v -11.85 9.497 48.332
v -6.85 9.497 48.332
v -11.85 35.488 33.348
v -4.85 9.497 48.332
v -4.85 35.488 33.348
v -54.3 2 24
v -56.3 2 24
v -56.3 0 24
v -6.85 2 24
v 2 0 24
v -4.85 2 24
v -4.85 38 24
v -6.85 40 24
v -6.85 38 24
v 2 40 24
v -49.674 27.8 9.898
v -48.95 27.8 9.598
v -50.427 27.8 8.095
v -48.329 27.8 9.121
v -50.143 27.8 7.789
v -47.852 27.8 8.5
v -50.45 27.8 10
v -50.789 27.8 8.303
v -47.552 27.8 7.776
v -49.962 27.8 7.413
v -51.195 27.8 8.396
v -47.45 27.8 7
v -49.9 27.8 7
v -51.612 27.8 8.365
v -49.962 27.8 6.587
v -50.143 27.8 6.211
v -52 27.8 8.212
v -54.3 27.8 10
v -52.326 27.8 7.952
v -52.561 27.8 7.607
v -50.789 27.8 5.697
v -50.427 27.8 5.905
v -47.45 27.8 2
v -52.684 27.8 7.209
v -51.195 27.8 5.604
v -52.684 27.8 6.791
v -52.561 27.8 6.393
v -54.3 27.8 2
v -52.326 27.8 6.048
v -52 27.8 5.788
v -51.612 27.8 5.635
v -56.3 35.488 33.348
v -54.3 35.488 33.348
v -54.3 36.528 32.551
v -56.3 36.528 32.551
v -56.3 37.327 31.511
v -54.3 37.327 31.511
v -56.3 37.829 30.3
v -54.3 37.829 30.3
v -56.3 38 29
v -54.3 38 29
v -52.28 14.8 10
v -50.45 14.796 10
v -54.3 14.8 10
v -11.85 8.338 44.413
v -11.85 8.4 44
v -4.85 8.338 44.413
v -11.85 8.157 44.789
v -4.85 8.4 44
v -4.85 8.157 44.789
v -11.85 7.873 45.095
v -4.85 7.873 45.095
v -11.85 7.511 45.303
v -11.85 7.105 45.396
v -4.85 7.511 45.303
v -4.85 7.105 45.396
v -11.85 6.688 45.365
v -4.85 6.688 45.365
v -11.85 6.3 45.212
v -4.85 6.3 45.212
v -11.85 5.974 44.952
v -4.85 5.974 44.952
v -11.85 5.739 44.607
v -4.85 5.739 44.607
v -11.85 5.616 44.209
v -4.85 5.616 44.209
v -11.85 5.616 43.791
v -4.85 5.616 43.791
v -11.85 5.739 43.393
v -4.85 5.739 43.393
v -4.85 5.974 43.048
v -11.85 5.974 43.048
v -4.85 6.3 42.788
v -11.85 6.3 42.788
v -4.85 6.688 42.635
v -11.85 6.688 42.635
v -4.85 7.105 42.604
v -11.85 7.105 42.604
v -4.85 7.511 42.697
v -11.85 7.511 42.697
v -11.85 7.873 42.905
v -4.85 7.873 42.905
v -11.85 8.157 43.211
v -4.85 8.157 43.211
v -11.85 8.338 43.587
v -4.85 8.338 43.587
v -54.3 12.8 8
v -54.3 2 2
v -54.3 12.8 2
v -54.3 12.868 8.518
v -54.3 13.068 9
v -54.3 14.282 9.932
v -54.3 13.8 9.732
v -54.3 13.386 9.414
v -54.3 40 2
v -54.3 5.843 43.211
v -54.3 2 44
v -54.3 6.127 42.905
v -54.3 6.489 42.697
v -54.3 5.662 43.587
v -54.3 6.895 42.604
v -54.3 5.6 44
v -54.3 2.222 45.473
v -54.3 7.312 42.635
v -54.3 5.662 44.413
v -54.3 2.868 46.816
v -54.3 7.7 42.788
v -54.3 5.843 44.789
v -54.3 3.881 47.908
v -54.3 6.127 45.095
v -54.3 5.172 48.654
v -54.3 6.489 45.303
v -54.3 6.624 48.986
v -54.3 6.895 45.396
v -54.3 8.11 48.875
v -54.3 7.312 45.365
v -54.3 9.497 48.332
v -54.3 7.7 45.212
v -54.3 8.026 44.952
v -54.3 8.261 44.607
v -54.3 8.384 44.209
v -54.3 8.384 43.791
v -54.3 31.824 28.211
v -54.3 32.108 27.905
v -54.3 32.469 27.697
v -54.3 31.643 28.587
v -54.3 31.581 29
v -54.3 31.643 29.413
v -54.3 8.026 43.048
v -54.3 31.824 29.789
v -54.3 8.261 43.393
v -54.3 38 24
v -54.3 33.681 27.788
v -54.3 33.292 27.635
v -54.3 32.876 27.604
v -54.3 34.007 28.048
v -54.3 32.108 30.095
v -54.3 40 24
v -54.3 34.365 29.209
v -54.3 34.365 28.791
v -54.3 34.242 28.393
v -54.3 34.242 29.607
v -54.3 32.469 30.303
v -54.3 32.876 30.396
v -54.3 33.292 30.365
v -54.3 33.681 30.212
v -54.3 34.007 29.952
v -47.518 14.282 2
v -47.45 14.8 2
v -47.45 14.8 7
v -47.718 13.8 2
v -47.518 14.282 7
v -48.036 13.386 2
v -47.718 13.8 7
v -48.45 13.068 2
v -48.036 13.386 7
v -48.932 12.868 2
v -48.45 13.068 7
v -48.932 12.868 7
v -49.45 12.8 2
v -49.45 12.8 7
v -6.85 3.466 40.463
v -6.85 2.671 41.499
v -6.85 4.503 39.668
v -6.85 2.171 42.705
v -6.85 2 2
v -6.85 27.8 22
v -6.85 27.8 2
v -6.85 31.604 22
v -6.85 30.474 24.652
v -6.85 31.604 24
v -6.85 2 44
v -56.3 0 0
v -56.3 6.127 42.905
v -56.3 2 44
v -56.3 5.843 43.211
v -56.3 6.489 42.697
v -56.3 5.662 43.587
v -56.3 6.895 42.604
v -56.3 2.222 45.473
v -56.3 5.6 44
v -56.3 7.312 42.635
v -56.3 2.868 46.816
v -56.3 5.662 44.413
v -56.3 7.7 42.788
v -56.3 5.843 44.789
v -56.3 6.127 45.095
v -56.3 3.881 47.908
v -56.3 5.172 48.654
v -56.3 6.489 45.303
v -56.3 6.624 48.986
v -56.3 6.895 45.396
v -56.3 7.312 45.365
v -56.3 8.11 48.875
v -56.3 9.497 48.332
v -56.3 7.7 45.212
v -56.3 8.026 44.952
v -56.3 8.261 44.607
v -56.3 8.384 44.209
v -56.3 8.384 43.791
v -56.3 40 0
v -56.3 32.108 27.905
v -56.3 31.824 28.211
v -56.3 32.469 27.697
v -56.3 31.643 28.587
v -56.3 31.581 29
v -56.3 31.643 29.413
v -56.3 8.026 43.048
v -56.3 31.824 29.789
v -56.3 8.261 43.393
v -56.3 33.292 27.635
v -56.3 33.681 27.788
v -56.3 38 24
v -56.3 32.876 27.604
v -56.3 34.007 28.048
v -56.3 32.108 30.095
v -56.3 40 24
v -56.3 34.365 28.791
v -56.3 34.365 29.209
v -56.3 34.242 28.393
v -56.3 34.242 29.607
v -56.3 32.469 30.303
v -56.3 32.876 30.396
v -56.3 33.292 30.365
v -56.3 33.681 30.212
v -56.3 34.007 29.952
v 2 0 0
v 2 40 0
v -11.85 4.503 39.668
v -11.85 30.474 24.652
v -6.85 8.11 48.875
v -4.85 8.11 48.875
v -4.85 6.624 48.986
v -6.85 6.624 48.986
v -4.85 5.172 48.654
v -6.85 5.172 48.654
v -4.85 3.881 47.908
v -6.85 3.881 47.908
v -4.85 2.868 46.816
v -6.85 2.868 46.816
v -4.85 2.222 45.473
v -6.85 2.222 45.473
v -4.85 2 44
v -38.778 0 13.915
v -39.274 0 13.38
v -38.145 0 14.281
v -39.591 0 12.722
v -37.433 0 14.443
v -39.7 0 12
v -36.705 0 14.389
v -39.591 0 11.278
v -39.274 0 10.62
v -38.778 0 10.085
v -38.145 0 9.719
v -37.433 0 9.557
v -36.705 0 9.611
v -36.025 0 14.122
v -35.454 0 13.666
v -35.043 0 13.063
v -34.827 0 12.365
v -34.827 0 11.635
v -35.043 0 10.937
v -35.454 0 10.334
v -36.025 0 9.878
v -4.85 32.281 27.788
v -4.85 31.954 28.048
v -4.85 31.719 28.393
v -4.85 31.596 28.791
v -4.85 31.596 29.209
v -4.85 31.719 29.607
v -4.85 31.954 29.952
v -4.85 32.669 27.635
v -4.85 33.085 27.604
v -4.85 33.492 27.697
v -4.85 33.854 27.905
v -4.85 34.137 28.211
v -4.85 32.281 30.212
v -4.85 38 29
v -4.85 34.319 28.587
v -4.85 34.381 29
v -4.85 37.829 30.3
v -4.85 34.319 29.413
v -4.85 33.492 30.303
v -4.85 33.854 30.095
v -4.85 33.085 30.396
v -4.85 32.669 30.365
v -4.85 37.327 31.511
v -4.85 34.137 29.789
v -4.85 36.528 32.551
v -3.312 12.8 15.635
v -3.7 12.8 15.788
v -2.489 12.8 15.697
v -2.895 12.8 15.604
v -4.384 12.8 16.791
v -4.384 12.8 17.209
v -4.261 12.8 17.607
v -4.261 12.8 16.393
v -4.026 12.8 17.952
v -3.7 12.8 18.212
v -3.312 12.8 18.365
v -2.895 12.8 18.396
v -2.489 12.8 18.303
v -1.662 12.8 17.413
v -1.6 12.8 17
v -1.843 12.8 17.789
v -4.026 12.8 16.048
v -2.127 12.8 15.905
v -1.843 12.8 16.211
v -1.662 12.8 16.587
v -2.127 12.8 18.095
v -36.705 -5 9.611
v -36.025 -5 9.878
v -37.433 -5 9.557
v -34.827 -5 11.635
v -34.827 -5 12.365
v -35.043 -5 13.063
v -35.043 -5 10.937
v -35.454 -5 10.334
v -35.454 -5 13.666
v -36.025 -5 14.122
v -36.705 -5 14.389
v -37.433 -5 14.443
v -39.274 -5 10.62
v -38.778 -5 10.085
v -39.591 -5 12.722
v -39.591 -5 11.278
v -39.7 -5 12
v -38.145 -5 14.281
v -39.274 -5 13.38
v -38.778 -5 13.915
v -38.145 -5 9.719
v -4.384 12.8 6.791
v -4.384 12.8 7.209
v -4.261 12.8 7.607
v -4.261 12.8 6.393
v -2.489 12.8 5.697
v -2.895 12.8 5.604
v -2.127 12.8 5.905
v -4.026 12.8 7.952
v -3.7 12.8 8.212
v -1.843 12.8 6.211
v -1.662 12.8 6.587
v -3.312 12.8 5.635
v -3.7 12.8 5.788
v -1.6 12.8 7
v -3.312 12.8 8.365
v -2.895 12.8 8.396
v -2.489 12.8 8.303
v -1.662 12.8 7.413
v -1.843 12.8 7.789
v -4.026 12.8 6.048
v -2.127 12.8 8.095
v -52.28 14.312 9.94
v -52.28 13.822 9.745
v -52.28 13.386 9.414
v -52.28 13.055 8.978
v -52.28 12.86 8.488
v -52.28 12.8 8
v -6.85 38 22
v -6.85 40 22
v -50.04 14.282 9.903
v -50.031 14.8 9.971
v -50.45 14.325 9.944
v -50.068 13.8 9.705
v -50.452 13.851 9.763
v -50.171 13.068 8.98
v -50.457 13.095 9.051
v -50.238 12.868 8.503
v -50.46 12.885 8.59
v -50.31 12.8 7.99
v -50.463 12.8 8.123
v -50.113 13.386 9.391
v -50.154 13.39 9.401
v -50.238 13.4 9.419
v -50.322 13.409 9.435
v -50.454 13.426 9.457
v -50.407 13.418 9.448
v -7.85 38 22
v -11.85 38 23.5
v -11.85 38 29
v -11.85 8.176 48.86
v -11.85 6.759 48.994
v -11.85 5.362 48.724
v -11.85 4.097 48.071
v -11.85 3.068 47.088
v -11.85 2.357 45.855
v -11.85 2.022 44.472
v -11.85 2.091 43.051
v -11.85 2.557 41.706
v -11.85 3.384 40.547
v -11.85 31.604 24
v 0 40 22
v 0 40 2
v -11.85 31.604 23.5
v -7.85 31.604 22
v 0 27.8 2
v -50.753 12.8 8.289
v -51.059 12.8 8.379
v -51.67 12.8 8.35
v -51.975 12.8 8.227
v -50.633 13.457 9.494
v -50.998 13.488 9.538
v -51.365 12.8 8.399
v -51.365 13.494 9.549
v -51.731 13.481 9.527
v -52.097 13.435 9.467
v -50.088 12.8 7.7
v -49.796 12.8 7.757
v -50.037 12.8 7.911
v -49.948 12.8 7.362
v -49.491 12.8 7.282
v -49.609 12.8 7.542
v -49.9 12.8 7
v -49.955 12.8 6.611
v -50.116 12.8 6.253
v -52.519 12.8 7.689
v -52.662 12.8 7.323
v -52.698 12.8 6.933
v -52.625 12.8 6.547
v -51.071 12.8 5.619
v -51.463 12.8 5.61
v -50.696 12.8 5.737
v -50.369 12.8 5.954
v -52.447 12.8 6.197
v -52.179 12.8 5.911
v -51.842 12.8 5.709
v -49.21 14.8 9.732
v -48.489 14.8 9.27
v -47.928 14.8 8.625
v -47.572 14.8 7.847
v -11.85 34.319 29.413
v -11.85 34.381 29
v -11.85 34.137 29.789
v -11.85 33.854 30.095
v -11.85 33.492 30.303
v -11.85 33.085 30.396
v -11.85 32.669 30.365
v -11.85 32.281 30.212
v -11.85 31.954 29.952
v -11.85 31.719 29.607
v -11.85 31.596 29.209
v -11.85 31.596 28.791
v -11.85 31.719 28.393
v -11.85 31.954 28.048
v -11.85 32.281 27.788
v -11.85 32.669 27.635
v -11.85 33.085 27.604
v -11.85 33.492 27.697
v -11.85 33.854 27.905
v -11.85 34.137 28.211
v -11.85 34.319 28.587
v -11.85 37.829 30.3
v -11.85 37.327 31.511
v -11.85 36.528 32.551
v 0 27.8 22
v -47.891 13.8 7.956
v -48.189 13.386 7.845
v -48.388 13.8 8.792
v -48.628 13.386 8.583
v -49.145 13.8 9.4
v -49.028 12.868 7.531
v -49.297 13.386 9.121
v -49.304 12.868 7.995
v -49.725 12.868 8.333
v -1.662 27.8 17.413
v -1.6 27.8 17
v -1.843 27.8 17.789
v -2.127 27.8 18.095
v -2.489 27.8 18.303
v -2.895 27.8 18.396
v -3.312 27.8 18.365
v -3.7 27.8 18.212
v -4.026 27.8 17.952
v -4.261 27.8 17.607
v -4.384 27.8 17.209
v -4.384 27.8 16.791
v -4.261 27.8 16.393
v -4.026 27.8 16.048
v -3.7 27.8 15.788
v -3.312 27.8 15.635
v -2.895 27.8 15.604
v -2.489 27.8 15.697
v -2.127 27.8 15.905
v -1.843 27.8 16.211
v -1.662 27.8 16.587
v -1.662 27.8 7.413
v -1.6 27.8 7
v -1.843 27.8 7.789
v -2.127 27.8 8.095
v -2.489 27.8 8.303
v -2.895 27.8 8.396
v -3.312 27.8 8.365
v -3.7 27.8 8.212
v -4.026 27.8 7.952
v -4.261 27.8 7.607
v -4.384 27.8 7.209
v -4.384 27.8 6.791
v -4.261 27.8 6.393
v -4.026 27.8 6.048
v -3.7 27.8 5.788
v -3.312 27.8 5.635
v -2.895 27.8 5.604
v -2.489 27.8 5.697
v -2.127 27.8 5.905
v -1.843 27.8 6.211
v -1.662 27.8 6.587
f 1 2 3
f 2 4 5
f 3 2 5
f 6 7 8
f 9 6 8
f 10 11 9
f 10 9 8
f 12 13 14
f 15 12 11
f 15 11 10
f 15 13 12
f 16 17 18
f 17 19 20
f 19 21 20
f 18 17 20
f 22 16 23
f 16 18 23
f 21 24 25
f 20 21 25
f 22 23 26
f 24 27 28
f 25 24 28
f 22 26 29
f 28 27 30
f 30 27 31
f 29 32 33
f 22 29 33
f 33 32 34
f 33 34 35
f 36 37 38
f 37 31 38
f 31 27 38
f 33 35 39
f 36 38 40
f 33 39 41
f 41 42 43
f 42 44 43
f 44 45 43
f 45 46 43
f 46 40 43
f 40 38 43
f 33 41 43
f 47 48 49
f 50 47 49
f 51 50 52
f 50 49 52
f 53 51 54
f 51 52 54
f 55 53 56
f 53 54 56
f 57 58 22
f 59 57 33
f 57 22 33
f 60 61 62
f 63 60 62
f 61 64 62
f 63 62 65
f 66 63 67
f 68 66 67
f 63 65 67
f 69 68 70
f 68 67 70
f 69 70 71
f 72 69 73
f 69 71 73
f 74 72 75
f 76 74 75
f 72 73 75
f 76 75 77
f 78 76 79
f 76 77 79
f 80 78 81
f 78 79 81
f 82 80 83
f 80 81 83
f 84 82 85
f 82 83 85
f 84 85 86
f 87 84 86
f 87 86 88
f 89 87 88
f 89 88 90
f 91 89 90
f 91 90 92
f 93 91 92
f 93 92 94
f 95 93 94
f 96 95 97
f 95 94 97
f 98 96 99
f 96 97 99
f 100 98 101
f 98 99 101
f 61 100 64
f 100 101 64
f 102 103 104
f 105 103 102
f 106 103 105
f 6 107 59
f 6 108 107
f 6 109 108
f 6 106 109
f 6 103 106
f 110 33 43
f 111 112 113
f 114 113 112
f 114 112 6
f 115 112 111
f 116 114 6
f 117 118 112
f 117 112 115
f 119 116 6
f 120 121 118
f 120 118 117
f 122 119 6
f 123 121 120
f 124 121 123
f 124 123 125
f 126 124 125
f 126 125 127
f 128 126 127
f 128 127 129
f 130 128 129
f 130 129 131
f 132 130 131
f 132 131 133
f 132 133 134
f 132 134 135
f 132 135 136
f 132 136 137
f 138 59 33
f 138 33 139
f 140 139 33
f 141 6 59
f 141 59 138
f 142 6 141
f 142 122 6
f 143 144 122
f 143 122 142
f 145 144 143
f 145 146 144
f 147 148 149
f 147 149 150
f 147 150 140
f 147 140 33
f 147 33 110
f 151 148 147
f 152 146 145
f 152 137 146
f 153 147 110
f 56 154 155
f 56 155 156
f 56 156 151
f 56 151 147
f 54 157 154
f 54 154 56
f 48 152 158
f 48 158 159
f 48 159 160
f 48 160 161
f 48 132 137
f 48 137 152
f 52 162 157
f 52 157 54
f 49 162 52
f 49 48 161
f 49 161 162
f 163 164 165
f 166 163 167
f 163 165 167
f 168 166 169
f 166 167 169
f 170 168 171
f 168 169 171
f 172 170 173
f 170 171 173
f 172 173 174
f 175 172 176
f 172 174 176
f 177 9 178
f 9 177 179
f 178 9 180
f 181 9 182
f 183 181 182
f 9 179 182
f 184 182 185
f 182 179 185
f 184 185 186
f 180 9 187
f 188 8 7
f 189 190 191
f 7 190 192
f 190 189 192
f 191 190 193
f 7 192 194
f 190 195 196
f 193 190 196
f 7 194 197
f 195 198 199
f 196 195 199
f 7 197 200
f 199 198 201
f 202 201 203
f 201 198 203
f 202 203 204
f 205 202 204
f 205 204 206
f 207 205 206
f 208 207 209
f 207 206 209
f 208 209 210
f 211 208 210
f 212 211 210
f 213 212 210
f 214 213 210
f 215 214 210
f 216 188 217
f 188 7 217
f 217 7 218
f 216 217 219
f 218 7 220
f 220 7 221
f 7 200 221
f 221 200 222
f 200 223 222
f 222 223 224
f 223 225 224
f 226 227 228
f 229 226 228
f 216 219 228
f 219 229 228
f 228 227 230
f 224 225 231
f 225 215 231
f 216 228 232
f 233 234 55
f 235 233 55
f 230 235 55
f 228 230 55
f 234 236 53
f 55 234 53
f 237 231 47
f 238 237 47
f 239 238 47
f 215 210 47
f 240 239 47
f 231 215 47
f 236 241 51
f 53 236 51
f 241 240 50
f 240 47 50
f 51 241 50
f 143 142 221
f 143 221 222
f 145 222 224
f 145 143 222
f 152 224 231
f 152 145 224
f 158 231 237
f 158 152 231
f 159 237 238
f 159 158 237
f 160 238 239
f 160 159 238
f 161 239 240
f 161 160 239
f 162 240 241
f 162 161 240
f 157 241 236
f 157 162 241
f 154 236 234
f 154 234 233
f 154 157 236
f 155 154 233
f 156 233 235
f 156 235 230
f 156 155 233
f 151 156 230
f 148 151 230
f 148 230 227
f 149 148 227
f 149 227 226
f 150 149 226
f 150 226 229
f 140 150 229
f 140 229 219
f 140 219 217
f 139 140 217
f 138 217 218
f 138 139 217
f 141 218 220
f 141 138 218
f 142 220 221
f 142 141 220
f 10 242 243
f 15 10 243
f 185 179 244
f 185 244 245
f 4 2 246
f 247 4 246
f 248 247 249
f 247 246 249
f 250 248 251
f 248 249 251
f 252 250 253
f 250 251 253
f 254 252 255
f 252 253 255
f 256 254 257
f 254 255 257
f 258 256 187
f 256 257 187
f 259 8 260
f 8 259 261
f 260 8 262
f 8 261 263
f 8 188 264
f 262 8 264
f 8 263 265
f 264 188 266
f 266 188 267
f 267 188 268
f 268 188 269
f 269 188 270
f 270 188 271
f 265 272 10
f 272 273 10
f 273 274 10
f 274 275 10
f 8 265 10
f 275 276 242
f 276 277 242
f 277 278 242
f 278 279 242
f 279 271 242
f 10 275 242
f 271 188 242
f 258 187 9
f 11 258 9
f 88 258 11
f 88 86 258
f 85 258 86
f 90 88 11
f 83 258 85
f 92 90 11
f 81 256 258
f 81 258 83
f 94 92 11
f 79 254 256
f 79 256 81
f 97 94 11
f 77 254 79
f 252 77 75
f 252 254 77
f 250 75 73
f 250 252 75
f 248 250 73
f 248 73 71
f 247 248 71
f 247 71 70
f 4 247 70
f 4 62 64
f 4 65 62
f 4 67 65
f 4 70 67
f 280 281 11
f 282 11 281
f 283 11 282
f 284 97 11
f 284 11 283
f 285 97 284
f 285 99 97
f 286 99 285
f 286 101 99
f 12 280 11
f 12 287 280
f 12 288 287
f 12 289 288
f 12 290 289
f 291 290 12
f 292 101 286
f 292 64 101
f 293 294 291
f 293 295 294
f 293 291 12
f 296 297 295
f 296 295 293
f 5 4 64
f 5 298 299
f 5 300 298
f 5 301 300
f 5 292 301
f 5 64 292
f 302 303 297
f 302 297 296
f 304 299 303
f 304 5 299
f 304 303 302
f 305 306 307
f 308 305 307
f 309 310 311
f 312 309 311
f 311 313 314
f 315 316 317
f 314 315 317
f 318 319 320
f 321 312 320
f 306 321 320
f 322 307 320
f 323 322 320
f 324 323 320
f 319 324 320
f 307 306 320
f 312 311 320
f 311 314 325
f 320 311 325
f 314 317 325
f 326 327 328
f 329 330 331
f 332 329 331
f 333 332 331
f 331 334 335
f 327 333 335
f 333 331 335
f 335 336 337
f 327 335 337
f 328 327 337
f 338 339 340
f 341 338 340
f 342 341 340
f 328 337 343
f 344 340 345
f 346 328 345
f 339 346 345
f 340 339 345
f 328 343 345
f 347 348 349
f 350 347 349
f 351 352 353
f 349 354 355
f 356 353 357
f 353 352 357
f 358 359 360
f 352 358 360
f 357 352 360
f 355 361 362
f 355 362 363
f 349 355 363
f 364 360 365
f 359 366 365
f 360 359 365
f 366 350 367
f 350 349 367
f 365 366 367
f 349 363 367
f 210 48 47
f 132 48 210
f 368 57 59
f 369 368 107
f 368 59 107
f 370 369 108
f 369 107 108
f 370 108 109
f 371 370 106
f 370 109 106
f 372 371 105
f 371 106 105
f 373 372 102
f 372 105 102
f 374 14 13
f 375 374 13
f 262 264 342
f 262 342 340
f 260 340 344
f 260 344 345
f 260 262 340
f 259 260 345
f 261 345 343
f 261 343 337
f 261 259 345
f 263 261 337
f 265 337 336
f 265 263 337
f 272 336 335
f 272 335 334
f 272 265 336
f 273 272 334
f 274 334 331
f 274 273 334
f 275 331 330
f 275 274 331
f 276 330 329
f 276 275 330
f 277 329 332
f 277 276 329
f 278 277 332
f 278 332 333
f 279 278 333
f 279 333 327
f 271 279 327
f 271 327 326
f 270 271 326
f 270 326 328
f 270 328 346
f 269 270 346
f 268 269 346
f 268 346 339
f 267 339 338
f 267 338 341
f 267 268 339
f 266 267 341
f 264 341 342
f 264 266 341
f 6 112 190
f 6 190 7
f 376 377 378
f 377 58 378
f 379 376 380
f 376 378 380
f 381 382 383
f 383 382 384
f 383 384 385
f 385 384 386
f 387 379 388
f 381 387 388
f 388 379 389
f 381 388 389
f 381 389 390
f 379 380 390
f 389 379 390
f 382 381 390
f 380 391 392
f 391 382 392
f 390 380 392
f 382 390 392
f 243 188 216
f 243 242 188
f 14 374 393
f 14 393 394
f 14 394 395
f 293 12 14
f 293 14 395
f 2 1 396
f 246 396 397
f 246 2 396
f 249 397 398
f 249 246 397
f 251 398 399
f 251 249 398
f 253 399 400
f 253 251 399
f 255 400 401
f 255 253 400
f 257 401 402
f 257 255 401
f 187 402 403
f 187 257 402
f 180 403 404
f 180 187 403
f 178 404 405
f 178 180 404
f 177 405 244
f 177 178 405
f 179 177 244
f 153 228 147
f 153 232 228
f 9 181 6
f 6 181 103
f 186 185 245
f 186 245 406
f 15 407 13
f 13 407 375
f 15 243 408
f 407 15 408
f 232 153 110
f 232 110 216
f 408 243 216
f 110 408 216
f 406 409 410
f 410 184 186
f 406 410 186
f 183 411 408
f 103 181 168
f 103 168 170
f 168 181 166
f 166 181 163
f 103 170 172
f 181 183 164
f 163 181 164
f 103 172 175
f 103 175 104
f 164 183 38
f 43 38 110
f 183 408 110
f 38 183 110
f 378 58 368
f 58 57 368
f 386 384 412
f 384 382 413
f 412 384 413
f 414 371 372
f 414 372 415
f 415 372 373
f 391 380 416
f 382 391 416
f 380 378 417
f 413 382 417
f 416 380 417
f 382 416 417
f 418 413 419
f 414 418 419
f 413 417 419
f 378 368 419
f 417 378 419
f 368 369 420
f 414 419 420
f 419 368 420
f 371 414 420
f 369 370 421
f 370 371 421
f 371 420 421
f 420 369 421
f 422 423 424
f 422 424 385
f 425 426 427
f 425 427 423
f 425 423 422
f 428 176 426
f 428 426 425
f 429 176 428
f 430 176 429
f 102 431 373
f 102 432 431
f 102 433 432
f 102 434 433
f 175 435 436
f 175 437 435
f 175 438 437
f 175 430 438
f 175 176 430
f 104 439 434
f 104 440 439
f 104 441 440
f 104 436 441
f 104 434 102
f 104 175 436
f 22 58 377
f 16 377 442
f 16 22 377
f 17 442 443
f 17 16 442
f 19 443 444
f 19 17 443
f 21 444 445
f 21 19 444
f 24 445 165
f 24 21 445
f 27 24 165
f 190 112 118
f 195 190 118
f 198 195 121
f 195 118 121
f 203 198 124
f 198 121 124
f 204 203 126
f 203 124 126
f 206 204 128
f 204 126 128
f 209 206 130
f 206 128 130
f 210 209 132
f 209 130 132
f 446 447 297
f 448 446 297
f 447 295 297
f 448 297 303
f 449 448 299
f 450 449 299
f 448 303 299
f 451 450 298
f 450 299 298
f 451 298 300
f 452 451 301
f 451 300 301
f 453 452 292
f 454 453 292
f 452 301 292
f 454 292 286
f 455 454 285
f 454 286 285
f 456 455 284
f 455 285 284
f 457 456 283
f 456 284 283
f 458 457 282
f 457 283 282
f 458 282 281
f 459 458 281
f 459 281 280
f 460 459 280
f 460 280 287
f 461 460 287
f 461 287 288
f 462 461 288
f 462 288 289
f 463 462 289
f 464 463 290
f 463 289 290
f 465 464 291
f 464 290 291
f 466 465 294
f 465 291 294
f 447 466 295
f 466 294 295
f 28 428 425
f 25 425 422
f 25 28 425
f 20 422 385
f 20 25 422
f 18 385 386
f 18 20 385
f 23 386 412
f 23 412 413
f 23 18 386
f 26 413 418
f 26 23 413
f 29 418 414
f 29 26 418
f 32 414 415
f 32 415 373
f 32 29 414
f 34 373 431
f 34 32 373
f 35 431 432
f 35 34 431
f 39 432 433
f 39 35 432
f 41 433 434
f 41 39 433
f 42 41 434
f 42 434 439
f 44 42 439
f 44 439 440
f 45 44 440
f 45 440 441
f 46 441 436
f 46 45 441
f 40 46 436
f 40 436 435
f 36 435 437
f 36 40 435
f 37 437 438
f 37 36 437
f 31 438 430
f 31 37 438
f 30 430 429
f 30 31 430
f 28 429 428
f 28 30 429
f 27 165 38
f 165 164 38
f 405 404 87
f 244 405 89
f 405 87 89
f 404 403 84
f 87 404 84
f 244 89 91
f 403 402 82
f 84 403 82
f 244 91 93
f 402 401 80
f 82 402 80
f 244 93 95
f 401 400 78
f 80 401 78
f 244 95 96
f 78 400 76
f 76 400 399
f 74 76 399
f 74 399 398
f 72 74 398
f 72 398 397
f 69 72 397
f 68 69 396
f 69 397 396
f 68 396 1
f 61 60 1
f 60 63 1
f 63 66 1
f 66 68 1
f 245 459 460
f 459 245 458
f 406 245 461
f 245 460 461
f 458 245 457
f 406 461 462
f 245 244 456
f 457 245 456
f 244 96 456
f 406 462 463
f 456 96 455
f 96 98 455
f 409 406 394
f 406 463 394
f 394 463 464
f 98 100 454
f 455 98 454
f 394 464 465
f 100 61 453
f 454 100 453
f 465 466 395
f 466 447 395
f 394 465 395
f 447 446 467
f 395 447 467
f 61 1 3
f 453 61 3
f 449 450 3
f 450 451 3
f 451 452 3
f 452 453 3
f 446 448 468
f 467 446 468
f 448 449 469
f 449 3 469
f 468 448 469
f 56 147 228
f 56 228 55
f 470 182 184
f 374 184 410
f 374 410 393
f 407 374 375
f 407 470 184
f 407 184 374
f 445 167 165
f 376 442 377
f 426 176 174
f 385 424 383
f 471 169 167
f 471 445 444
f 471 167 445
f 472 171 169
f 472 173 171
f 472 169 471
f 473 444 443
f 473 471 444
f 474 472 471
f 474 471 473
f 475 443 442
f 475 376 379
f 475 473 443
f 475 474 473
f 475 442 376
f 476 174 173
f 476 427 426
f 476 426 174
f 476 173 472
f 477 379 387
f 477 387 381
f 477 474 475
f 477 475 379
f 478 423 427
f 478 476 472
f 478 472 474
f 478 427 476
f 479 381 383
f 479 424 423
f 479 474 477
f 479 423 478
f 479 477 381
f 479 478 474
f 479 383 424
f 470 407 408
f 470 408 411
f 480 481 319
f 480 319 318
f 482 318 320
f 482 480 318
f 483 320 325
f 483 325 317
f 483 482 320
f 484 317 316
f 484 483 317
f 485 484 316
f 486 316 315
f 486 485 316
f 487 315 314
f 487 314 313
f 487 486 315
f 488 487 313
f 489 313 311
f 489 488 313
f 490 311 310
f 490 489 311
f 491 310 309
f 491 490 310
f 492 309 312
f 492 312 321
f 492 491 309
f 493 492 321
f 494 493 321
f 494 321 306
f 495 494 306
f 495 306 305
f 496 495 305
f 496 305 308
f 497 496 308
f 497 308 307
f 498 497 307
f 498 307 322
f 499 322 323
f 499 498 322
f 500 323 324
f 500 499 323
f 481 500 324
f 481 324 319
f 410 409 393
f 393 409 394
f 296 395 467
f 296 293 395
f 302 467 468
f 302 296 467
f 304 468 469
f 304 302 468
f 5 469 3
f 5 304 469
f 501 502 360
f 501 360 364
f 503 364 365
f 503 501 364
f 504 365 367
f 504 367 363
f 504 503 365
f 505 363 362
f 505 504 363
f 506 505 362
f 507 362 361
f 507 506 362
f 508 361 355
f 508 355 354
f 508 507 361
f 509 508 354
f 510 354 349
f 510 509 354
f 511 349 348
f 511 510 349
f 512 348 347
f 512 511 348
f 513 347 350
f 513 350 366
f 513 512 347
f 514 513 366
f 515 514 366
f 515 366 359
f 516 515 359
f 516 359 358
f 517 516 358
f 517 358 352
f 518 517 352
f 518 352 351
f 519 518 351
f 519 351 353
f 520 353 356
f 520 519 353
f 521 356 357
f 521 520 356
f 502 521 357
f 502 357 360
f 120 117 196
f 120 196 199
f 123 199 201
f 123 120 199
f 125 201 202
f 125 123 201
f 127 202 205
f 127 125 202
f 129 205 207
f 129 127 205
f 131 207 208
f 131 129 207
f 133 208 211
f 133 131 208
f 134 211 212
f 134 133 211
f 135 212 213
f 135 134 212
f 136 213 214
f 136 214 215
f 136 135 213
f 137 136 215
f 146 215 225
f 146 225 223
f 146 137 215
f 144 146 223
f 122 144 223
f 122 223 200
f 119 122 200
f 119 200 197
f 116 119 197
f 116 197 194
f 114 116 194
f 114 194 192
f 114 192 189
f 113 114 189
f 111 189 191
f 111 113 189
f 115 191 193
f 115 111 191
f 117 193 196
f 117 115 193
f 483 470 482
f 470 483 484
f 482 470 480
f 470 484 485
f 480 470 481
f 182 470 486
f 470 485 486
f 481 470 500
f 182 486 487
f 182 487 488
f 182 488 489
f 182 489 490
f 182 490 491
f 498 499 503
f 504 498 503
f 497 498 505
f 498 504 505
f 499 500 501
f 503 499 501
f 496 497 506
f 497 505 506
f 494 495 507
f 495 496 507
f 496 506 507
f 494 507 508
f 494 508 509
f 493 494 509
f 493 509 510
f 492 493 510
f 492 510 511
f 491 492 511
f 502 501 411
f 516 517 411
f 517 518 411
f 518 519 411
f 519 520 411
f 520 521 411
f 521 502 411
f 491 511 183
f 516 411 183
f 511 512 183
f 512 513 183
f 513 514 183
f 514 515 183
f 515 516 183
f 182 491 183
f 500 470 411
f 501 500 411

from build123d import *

# Parameters (mm, degrees)
SKETCH_W        = 54.3
SKETCH_H        = 38
PAD_DEPTH       = 2
SKETCH001_W     = 54.3
SKETCH001_H     = 2
PAD001_DEPTH    = 22
SKETCH002_R     = 2.45
PAD002_DEPTH    = 5
SKETCH003_W     = 40
SKETCH003_H     = 22
PAD003_DEPTH    = 2
SKETCH004_W     = 40
SKETCH004_H     = 22
PAD004_DEPTH    = 2
SKETCH005_W     = 6.85
SKETCH005_H     = 15
PAD005_DEPTH    = 8
SKETCH006_R     = 1.4
POCKET_DEPTH    = 15
FILLET_R        = 3
FILLET001_R     = 2
SKETCH007_W     = 6.85
SKETCH007_H     = 25.8
PAD006_DEPTH    = 20
SKETCH008_R     = 1.4
POCKET001_DEPTH = 15
PAD007_DEPTH    = 2
SKETCH010_R     = 1.4
PAD008_DEPTH    = 2
SKETCH011_R     = 1.4
PAD009_DEPTH    = 2
SKETCH012_R     = 1.4
PAD010_DEPTH    = 5
SKETCH013_W     = 6.395784
SKETCH013_H     = 2
PAD011_DEPTH    = 5
CHAMFER_SIZE2   = 1.5
CHAMFER_SIZE    = 4


with BuildPart() as body:
    # Sketch → Pad (new body)
    with BuildSketch(Plane.XY):
        with Locations((27.15, 21)):
            Rectangle(SKETCH_W, SKETCH_H)
    extrude(amount=PAD_DEPTH)

    # Sketch001 → Pad001 (join)
    with BuildSketch(Plane.XY):
        with Locations((27.15, 1)):
            Rectangle(SKETCH001_W, SKETCH001_H)
    extrude(amount=PAD001_DEPTH)

    # Sketch002 → Pad002 (join)
    with BuildSketch(Plane.XZ):
        with Locations((37.25, 12)):
            Circle(SKETCH002_R)
    extrude(amount=PAD002_DEPTH)

    # Sketch003 (on Face2 of Pad002) → Pad003 (join)
    with BuildSketch(Plane(origin=(0, 0, 0), x_dir=(0, -1, 0), z_dir=(-1, 0, 0))):
        with Locations((-20, 11)):
            Rectangle(SKETCH003_W, SKETCH003_H)
    extrude(amount=PAD003_DEPTH)

    # Sketch004 (on Face3 of Pad003) → Pad004 (join)
    with BuildSketch(Plane.YZ.offset(54.3)):
        with Locations((20, 11)):
            Rectangle(SKETCH004_W, SKETCH004_H)
    extrude(amount=PAD004_DEPTH)

    # Sketch005 (on Face5 of Pad004) → Pad005 (join)
    with BuildSketch(Plane.XY.offset(2)):
        with Locations((50.875, 20.3)):
            Rectangle(SKETCH005_W, SKETCH005_H)
    extrude(amount=PAD005_DEPTH)

    # Sketch006 (on Face15 of Pad005) → Pocket (cut)
    with BuildSketch(Plane(origin=(0, 27.8, 0), x_dir=(-1, 0, 0), z_dir=(0, 1, 0))):
        with Locations((-51.3, 7)):
            Circle(SKETCH006_R)
    extrude(amount=-POCKET_DEPTH, mode=Mode.SUBTRACT)

    # Fillet
    fillet_edges = [body.edges().sort_by_distance(p)[0] for p in [
        (47.45, 20.3, 10),
    ]]
    fillet(fillet_edges, radius=FILLET_R)

    # Fillet001
    fillet001_edges = [body.edges().sort_by_distance(p)[0] for p in [
        (52.375, 12.8, 10),
    ]]
    fillet(fillet001_edges, radius=FILLET001_R)

    # Sketch007 (on Face5 of Fillet001) → Pad006 (join)
    with BuildSketch(Plane.XY.offset(2)):
        with Locations((3.425, 14.9)):
            Rectangle(SKETCH007_W, SKETCH007_H)
    extrude(amount=PAD006_DEPTH)

    # Sketch008 (on Face14 of Pad006) → Pocket001 (cut)
    with BuildSketch(Plane(origin=(0, 27.8, 0), x_dir=(-1, 0, 0), z_dir=(0, 1, 0))):
        with Locations((-3, 7)):
            Circle(SKETCH008_R)
        with Locations((-3, 17)):
            Circle(SKETCH008_R)
    extrude(amount=-POCKET001_DEPTH, mode=Mode.SUBTRACT)

    # Sketch009 (on Face21 of Pocket001) → Pad007 (join)
    with BuildSketch(Plane.XY.offset(22)):
        Polygon((54.3, 2), (54.3, 40), (56.3, 40), (56.3, 0), (-2, 0), (-2, 40), (6.85, 40), (6.85, 2), align=None)
    extrude(amount=PAD007_DEPTH)

    # Sketch010 (on Face22 of Pad007) → Pad008 (join)
    with BuildSketch(Plane.YZ.offset(6.85)):
        with BuildLine():
            Line((2, 24), (38, 24))
            Line((38, 29), (38, 24))
            ThreePointArc((38, 29), (37.326745, 31.511013), (35.487593, 33.348396))
            Line((35.487593, 33.348396), (9.497223, 48.331729))
            ThreePointArc((9.497223, 48.331729), (4.498612, 48.329325), (2, 44))
            Line((2, 44), (2, 24))
        make_face()
        with Locations((7, 44)):
            Circle(SKETCH010_R, mode=Mode.SUBTRACT)
        with Locations((32.980762, 29)):
            Circle(SKETCH010_R, mode=Mode.SUBTRACT)
    extrude(amount=-PAD008_DEPTH)

    # Sketch011 (on Face20 of Pad008) → Pad009 (join)
    with BuildSketch(Plane(origin=(54.3, 0, 0), x_dir=(0, -1, 0), z_dir=(-1, 0, 0))):
        with BuildLine():
            Line((-38, 24), (-38, 29))
            ThreePointArc((-35.487593, 33.348396), (-37.326745, 31.511013), (-38, 29))
            Line((-35.487593, 33.348396), (-9.497223, 48.331729))
            ThreePointArc((-2, 44), (-4.498612, 48.329325), (-9.497223, 48.331729))
            Line((-2, 44), (-2, 24))
            Line((-2, 24), (-38, 24))
        make_face()
        with Locations((-7, 44)):
            Circle(SKETCH011_R, mode=Mode.SUBTRACT)
        with Locations((-32.980762, 29)):
            Circle(SKETCH011_R, mode=Mode.SUBTRACT)
    extrude(amount=-PAD009_DEPTH)

    # Sketch012 (on Face35 of Pad009) → Pad010 (join)
    with BuildSketch(Plane.YZ.offset(6.85)):
        with BuildLine():
            Line((38, 29), (38, 24))
            Line((38, 24), (31.604216, 24))
            Line((30.473931, 24.651604), (31.604216, 24))
            Line((4.502799, 39.668258), (30.473931, 24.651604))
            ThreePointArc((9.497223, 48.331729), (2.668265, 46.497212), (4.502799, 39.668258))
            Line((9.497223, 48.331729), (35.487593, 33.348396))
            ThreePointArc((38, 29), (37.326745, 31.511013), (35.487593, 33.348396))
        make_face()
        with Locations((7, 44)):
            Circle(SKETCH012_R, mode=Mode.SUBTRACT)
        with Locations((32.980762, 29)):
            Circle(SKETCH012_R, mode=Mode.SUBTRACT)
    extrude(amount=PAD010_DEPTH)

    # Sketch013 (on Face22 of Pad010) → Pad011 (join)
    with BuildSketch(Plane.YZ.offset(6.85)):
        with Locations((34.802108, 23)):
            Rectangle(SKETCH013_W, SKETCH013_H)
    extrude(amount=PAD011_DEPTH)

    # Chamfer
    chamfer_edges = [body.edges().sort_by_distance(p)[0] for p in [
        (11.85, 34.802108, 22),
    ]]
    chamfer_side = body.faces().sort_by_distance((9.35, 34.802108, 22))[0]
    chamfer(chamfer_edges, length=CHAMFER_SIZE, length2=CHAMFER_SIZE2, reference=chamfer_side)


with BuildPart() as part_mirroring:
    # Part__Mirroring: instance of Body
    add(body.part.mirror(Plane(origin=(0, 0, 0), x_dir=(0, -1, 0), z_dir=(1, 0, 0))))


solid = part_mirroring.part
